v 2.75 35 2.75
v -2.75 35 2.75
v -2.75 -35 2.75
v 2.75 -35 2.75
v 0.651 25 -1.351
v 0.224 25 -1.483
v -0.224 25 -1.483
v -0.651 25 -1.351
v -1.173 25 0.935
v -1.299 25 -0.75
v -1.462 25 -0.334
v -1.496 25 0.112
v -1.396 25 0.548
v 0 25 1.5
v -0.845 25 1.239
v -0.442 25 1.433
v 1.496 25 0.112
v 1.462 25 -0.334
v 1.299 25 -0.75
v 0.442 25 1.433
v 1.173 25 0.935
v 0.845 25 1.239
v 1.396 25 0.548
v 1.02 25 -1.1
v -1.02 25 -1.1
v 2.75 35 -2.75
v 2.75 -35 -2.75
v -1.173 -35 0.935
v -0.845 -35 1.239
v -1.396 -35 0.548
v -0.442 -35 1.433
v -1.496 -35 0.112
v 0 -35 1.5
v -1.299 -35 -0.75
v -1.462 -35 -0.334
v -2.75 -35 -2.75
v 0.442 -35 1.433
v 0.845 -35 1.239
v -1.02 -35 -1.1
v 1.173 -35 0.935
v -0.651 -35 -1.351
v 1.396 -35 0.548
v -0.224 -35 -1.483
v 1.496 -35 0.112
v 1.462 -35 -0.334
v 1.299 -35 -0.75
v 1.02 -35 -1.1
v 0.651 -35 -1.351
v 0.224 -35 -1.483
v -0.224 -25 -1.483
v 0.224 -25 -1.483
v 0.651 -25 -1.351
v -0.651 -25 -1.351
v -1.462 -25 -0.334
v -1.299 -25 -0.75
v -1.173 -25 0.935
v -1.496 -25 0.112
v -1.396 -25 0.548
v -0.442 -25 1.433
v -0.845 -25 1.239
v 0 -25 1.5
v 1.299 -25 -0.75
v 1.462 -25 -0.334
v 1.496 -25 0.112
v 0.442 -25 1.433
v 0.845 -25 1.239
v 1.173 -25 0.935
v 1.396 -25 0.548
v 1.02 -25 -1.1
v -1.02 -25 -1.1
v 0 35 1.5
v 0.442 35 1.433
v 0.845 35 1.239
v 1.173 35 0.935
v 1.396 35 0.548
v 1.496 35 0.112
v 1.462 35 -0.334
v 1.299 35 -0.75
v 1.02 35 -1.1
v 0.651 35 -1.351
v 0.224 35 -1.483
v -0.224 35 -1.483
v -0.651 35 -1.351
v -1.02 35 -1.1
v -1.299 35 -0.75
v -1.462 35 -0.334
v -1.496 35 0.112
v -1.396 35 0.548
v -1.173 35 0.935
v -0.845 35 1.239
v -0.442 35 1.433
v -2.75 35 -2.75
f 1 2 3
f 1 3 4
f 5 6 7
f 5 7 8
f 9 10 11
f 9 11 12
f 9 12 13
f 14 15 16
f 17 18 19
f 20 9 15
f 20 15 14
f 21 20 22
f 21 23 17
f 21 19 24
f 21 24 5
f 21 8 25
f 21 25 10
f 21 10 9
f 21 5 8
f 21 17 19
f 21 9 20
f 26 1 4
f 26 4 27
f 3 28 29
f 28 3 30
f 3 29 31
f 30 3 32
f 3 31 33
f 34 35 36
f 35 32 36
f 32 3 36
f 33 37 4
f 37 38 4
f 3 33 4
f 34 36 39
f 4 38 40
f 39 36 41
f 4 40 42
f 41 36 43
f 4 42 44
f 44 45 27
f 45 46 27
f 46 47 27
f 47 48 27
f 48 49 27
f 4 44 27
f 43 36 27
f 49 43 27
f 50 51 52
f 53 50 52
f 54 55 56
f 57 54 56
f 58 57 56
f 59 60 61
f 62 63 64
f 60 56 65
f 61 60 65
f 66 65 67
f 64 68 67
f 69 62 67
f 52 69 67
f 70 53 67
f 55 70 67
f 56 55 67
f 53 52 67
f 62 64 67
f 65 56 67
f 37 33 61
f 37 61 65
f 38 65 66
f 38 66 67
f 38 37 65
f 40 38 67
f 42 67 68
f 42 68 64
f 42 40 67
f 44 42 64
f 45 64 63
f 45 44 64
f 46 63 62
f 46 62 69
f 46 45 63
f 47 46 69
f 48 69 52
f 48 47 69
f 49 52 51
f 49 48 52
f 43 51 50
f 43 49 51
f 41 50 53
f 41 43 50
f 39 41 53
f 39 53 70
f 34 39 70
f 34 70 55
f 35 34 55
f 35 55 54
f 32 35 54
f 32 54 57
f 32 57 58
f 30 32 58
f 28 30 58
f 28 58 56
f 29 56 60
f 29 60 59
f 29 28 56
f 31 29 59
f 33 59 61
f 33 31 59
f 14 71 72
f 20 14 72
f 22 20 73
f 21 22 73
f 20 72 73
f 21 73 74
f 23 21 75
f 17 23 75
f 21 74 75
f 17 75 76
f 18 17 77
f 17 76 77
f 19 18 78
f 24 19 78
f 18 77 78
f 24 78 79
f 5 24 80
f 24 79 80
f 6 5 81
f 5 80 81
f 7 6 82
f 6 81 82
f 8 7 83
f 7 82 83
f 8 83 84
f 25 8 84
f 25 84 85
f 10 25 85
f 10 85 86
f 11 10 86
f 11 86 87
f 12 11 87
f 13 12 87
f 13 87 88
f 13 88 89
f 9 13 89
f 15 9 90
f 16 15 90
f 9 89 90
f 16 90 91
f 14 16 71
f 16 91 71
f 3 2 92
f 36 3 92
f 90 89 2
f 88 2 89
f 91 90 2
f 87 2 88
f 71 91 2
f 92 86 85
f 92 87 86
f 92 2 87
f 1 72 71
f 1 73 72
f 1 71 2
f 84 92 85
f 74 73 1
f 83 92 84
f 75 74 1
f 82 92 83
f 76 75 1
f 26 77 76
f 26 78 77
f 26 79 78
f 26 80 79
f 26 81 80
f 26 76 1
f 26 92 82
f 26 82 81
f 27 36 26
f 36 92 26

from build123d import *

# Parameters (mm, degrees)
SKETCH1_W           = 5.5
SKETCH1_H           = 5.5
BOSS_EXTRUDE1_DEPTH = 35
SKETCH3_R           = 1.5
CUT_EXTRUDE1_DEPTH  = 10


with BuildPart() as part:
    # Sketch1 → Boss-Extrude1 (new, symmetric)
    with BuildSketch(Plane(origin=(0, 0, 0), x_dir=(1, 0, 0), z_dir=(0, 1, 0))):
        Rectangle(SKETCH1_W, SKETCH1_H)
    extrude(amount=BOSS_EXTRUDE1_DEPTH, both=True)

    # Sketch3 → Cut-Extrude1 (cut)
    with BuildSketch(Plane(origin=(0, 35, 0), x_dir=(1, 0, 0), z_dir=(0, 1, 0))):
        with Locations(Location((0, 0, 0), (0, 0, 270))):
            Circle(SKETCH3_R)
    cut_extrude1 = extrude(amount=-CUT_EXTRUDE1_DEPTH, mode=Mode.SUBTRACT)

    # Mirror1: Cut-Extrude1 across plane
    add(cut_extrude1.mirror(Plane.ZX), mode=Mode.SUBTRACT)


solid = part.part
